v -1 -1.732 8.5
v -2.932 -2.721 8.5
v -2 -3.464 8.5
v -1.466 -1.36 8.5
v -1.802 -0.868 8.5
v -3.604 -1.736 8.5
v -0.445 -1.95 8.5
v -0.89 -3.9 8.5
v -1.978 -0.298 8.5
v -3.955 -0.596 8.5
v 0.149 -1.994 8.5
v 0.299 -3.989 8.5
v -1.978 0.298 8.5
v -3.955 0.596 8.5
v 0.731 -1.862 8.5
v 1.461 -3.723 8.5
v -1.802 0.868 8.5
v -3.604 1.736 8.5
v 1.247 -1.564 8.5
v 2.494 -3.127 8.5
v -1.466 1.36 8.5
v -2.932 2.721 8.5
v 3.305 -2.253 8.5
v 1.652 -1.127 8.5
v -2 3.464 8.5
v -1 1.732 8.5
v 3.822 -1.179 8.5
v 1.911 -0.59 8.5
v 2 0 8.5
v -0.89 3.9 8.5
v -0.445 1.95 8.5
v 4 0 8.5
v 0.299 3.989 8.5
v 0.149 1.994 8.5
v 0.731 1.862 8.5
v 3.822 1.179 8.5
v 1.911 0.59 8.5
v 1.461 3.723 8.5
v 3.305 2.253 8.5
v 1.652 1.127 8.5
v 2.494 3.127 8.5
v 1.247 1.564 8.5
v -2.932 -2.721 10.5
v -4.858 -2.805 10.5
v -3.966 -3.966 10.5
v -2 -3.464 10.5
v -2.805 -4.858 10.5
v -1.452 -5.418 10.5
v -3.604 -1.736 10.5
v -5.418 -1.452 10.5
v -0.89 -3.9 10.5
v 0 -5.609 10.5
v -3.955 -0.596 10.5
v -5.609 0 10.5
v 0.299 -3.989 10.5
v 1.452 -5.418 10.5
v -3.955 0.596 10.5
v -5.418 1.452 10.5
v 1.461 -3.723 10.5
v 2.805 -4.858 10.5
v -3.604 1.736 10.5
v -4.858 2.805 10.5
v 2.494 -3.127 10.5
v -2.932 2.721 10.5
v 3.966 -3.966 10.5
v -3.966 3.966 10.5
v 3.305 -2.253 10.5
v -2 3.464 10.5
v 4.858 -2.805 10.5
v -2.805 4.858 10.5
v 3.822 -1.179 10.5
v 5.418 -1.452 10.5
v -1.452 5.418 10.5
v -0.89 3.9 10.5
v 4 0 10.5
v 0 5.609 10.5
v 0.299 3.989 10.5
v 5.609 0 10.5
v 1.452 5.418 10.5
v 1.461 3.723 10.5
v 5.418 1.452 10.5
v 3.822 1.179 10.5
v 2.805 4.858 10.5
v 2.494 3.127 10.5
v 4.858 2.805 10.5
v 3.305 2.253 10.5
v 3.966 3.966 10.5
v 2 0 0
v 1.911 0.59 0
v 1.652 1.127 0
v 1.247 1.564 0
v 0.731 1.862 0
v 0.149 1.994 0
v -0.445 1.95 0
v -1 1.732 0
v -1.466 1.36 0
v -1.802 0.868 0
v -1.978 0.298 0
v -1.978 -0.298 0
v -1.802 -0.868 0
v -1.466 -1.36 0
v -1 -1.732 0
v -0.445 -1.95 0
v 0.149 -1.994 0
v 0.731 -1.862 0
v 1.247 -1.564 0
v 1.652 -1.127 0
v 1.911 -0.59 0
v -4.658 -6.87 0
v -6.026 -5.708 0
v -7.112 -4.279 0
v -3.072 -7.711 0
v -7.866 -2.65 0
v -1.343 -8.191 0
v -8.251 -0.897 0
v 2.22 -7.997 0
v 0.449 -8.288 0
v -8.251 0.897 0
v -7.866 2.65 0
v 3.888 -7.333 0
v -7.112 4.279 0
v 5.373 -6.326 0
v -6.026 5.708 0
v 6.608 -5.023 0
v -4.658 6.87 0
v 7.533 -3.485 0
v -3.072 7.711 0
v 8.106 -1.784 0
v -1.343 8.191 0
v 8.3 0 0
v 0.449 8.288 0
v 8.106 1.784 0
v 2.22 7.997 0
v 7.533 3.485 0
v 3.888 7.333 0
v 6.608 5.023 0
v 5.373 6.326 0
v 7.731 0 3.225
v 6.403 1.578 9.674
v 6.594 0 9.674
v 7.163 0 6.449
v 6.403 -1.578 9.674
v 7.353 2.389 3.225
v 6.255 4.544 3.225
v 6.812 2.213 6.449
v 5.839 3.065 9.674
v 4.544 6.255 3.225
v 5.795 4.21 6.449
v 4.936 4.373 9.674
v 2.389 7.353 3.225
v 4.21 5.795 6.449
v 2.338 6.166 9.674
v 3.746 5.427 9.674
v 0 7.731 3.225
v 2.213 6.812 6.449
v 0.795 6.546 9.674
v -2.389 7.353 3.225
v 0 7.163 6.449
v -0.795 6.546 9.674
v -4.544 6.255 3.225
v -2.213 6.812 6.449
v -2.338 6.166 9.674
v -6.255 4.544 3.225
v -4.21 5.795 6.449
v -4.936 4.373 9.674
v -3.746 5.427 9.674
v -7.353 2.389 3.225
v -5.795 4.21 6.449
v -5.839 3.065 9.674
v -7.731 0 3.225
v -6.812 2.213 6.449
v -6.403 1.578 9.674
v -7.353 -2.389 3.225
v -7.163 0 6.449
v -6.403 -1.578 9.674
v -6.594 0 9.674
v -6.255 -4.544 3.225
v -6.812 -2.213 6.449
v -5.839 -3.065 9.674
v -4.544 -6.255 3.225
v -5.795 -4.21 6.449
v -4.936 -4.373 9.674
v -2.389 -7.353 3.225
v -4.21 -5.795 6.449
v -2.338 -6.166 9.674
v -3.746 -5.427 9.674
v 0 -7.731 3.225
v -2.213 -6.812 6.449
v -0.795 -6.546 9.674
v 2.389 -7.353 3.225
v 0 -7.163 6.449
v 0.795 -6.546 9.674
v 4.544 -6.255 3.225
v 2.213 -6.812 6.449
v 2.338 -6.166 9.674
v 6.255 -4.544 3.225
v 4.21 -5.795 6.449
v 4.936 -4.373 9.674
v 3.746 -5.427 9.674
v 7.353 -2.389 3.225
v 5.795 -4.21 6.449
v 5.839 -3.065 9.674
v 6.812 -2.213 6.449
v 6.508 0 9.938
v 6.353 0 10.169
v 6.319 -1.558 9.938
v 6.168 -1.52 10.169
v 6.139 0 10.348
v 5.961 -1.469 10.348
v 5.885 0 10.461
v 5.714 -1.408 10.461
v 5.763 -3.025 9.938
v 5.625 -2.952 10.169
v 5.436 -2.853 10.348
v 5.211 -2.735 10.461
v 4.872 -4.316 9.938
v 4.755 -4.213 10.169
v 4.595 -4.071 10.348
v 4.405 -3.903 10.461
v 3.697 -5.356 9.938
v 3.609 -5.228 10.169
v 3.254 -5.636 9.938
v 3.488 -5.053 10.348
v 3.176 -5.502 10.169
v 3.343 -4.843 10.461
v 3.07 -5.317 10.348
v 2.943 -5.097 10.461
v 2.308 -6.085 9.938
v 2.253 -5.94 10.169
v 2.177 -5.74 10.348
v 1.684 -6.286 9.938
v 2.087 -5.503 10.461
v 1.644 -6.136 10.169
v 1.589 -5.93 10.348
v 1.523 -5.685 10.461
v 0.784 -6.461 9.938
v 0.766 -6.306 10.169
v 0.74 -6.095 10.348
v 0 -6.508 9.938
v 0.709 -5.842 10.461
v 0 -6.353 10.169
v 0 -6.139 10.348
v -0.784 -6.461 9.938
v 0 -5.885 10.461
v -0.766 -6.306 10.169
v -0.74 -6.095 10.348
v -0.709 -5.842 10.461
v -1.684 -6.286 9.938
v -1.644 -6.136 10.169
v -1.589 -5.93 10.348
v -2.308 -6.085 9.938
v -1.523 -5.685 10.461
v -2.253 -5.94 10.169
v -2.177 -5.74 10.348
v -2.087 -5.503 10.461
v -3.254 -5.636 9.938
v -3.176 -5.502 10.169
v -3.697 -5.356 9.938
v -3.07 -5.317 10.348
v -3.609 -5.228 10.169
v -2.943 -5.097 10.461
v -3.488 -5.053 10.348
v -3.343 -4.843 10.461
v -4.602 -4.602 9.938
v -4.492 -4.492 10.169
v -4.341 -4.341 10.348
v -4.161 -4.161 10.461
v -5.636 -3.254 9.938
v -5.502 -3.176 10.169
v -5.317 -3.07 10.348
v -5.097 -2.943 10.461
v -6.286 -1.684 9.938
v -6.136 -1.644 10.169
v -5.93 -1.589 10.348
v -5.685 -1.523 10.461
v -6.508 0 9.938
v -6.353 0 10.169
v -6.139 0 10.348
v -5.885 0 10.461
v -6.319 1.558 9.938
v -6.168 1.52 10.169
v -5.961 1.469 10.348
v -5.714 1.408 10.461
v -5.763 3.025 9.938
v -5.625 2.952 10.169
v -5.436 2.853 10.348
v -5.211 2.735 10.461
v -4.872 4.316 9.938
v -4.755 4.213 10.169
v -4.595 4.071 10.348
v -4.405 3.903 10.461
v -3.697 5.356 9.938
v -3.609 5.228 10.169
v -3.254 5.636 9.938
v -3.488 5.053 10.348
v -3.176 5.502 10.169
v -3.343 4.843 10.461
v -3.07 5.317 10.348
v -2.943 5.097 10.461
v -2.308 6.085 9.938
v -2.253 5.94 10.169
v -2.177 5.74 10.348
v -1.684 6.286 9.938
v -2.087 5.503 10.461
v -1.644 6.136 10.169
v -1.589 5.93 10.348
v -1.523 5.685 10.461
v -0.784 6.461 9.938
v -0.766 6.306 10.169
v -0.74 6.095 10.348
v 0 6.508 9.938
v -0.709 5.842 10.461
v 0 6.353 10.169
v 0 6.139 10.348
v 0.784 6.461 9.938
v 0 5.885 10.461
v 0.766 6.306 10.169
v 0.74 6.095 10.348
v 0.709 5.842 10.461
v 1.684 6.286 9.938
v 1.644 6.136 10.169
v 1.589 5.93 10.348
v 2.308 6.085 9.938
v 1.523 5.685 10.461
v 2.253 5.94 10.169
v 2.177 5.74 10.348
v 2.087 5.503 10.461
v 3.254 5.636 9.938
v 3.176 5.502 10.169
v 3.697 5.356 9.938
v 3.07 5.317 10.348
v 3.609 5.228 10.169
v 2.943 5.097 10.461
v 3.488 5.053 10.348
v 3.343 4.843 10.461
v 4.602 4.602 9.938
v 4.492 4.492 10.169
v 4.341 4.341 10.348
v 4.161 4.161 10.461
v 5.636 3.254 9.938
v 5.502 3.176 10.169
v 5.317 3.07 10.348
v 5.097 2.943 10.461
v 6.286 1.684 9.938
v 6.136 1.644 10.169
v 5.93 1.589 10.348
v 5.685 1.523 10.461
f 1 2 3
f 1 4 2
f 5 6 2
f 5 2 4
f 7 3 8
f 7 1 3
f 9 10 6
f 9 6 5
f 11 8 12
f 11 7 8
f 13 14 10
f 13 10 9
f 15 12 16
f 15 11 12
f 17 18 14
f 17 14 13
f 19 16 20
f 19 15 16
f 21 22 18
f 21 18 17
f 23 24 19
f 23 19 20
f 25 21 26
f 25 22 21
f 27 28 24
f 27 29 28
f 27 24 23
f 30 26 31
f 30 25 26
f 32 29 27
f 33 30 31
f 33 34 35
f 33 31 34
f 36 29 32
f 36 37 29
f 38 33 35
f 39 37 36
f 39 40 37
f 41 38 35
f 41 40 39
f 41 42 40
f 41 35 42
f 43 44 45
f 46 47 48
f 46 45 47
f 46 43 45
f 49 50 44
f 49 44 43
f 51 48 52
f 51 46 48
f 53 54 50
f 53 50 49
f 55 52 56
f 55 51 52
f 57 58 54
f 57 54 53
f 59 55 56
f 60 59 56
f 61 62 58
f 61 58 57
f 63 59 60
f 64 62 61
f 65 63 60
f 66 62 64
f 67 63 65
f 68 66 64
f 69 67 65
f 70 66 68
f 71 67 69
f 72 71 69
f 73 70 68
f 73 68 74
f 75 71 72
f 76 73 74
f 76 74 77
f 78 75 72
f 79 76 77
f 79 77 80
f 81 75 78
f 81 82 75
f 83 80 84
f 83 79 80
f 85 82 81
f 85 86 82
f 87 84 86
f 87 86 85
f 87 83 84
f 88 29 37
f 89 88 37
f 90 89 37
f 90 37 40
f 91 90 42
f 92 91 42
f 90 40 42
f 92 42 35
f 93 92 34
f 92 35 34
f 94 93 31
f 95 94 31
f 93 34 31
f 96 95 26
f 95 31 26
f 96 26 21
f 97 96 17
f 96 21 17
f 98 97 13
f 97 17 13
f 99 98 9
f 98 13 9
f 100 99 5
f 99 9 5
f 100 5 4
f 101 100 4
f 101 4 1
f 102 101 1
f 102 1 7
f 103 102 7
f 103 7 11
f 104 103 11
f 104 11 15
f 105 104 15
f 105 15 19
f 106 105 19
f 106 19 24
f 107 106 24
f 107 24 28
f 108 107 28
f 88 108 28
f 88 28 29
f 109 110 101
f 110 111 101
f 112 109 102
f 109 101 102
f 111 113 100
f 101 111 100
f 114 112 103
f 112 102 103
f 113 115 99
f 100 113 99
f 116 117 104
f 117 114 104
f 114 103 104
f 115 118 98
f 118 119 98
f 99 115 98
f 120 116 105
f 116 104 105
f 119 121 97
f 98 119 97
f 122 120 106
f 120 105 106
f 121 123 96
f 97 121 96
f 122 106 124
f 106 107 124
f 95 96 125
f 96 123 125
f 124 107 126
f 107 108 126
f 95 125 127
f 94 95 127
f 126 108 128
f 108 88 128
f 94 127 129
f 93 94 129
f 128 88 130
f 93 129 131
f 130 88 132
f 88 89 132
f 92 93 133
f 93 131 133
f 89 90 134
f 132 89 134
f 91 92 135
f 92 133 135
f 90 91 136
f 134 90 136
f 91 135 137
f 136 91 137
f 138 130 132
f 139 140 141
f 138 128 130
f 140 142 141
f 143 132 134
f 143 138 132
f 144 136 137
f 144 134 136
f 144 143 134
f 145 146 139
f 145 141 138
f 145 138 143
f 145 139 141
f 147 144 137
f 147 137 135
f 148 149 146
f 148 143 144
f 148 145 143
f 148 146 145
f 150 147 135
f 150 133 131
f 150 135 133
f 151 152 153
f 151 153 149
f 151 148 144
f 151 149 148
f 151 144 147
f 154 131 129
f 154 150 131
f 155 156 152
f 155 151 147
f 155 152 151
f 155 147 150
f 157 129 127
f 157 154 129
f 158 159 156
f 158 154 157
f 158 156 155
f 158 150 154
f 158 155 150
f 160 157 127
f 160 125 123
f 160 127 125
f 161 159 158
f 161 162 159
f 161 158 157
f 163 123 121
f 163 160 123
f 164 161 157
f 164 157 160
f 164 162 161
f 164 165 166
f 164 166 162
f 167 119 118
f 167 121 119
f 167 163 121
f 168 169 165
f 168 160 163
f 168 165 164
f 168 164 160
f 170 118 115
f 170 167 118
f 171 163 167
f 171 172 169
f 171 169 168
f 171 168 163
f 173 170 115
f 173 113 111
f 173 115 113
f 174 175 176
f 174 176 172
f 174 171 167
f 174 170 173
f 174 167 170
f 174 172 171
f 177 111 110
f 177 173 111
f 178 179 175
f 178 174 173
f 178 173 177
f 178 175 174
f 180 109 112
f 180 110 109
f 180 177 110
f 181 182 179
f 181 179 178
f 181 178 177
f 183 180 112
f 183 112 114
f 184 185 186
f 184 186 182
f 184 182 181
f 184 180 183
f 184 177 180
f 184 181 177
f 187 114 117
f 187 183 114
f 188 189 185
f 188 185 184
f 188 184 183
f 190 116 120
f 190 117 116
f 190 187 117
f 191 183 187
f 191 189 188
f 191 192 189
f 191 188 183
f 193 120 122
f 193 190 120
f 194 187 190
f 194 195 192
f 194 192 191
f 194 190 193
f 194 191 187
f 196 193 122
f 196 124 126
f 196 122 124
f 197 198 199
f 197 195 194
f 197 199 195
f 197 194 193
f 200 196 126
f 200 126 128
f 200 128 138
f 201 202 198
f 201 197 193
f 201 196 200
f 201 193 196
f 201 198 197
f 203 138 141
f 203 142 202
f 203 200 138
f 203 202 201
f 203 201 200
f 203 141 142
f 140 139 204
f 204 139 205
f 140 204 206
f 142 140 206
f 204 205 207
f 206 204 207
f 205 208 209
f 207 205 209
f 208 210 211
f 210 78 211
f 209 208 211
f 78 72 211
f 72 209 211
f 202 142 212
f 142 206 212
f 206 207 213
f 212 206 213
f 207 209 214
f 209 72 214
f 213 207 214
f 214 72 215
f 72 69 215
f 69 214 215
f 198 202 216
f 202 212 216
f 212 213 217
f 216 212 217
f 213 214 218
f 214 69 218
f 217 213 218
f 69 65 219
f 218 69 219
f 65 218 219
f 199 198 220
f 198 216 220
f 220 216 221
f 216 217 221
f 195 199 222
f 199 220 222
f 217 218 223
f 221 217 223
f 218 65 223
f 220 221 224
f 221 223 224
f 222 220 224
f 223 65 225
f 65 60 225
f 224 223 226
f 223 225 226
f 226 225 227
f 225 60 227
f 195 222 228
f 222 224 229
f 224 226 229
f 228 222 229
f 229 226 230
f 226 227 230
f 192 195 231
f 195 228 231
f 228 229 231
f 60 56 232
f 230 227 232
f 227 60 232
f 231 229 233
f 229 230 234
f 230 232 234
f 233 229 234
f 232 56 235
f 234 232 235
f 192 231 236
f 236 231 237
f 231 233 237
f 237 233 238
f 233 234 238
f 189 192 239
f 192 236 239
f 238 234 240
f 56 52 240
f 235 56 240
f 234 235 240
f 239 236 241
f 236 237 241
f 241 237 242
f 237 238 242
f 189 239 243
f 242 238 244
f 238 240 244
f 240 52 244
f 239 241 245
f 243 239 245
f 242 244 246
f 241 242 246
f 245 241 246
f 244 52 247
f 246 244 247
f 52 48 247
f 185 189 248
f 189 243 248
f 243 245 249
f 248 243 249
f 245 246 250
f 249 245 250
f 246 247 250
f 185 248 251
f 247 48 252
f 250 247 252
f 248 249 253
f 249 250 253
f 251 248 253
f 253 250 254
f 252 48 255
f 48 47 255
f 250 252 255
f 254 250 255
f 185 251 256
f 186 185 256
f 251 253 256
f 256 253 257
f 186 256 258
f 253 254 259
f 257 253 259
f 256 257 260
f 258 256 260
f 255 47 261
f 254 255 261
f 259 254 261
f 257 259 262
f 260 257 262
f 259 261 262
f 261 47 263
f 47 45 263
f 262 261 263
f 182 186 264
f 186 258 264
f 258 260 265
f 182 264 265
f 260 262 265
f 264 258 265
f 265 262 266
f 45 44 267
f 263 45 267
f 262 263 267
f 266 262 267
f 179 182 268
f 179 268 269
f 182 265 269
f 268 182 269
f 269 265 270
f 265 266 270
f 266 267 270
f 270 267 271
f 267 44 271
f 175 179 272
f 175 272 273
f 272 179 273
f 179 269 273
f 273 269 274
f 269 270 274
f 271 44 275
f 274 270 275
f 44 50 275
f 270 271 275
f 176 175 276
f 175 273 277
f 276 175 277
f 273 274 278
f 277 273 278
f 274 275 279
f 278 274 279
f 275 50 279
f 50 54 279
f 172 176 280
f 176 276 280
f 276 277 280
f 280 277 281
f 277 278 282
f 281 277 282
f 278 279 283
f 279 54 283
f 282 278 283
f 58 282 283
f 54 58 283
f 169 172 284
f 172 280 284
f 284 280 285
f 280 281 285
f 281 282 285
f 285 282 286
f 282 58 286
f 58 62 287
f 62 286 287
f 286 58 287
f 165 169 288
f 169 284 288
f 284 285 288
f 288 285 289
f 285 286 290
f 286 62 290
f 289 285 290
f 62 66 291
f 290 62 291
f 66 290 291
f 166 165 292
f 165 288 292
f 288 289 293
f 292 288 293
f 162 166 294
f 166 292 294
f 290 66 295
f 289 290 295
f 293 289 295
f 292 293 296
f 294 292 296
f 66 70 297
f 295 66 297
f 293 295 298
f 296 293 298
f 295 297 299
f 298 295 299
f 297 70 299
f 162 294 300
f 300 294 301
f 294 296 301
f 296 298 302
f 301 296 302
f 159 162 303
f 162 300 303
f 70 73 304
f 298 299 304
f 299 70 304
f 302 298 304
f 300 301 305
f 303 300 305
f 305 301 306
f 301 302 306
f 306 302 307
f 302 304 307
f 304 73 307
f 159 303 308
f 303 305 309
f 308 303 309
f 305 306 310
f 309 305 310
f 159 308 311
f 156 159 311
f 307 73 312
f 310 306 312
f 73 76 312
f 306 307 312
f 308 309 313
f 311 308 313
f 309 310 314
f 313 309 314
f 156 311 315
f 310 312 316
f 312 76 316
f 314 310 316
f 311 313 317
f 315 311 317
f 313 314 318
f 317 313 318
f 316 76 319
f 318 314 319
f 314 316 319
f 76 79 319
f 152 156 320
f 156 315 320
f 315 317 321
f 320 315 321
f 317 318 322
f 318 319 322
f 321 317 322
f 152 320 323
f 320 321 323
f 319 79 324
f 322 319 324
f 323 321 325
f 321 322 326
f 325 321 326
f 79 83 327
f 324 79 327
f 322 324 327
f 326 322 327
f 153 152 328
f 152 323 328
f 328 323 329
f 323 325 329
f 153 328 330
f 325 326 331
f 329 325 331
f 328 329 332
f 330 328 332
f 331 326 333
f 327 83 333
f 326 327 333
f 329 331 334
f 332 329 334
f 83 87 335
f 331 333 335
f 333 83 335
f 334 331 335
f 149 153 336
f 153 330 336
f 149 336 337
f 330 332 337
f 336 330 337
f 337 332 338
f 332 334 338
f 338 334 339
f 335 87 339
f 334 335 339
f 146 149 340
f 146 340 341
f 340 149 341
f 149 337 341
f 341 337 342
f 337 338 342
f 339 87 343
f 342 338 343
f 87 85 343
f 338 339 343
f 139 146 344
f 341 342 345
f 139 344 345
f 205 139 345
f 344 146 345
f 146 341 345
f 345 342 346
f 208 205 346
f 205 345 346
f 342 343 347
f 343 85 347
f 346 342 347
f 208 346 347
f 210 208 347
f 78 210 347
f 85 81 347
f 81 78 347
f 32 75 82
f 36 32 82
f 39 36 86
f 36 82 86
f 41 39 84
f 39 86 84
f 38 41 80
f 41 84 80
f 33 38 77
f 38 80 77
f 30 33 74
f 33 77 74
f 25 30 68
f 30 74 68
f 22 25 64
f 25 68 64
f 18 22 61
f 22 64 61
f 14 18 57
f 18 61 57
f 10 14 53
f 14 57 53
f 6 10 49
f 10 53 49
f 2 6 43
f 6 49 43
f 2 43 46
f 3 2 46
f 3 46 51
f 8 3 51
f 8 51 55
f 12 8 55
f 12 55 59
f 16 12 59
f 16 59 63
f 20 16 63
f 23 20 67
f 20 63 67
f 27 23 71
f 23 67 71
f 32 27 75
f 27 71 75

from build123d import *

# Parameters (mm, degrees)
ESQUISSE1_R             = 8.3
BOSS_EXTRU_1_DEPTH      = 10.5
BOSS_EXTRU_1_TAPER      = 10
ESQUISSE2_R             = 4
ENL_V_MAT_EXTRU_1_DEPTH = 2
ESQUISSE3_R             = 2
ENL_V_MAT_EXTRU_2_DEPTH = 14
CONG_1_R                = 1


with BuildPart() as part:
    # Esquisse1 → Boss.-Extru.1 (new body)
    with BuildSketch(Plane.XY):
        Circle(ESQUISSE1_R)
    extrude(amount=BOSS_EXTRU_1_DEPTH, taper=BOSS_EXTRU_1_TAPER)

    # Esquisse2 → Enlèv. mat.-Extru.1 (cut)
    with BuildSketch(Plane.XY.offset(10.5)):
        Circle(ESQUISSE2_R)
    extrude(amount=-ENL_V_MAT_EXTRU_1_DEPTH, mode=Mode.SUBTRACT)

    # Esquisse3 → Enlèv. mat.-Extru.2 (cut)
    with BuildSketch(Plane.XY.offset(8.5)):
        Circle(ESQUISSE3_R)
    extrude(amount=-ENL_V_MAT_EXTRU_2_DEPTH, mode=Mode.SUBTRACT)

    # Congé1
    cong_1_edges = [part.edges().sort_by_distance(p)[0] for p in [
        (-6.448566703, 0, 10.5),
    ]]
    fillet(cong_1_edges, radius=CONG_1_R)


solid = part.part
